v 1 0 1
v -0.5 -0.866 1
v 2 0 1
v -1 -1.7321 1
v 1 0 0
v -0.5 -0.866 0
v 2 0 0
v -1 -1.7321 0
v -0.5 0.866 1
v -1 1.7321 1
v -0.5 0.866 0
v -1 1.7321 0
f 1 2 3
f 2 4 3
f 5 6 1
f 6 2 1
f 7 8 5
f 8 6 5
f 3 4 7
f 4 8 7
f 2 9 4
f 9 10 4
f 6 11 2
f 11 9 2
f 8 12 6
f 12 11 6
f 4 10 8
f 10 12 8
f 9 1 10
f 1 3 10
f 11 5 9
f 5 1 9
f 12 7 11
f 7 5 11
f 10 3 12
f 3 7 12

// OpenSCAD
rotate_extrude(angle=450, $fn=3) translate([-2,0]) square([1,1]);
